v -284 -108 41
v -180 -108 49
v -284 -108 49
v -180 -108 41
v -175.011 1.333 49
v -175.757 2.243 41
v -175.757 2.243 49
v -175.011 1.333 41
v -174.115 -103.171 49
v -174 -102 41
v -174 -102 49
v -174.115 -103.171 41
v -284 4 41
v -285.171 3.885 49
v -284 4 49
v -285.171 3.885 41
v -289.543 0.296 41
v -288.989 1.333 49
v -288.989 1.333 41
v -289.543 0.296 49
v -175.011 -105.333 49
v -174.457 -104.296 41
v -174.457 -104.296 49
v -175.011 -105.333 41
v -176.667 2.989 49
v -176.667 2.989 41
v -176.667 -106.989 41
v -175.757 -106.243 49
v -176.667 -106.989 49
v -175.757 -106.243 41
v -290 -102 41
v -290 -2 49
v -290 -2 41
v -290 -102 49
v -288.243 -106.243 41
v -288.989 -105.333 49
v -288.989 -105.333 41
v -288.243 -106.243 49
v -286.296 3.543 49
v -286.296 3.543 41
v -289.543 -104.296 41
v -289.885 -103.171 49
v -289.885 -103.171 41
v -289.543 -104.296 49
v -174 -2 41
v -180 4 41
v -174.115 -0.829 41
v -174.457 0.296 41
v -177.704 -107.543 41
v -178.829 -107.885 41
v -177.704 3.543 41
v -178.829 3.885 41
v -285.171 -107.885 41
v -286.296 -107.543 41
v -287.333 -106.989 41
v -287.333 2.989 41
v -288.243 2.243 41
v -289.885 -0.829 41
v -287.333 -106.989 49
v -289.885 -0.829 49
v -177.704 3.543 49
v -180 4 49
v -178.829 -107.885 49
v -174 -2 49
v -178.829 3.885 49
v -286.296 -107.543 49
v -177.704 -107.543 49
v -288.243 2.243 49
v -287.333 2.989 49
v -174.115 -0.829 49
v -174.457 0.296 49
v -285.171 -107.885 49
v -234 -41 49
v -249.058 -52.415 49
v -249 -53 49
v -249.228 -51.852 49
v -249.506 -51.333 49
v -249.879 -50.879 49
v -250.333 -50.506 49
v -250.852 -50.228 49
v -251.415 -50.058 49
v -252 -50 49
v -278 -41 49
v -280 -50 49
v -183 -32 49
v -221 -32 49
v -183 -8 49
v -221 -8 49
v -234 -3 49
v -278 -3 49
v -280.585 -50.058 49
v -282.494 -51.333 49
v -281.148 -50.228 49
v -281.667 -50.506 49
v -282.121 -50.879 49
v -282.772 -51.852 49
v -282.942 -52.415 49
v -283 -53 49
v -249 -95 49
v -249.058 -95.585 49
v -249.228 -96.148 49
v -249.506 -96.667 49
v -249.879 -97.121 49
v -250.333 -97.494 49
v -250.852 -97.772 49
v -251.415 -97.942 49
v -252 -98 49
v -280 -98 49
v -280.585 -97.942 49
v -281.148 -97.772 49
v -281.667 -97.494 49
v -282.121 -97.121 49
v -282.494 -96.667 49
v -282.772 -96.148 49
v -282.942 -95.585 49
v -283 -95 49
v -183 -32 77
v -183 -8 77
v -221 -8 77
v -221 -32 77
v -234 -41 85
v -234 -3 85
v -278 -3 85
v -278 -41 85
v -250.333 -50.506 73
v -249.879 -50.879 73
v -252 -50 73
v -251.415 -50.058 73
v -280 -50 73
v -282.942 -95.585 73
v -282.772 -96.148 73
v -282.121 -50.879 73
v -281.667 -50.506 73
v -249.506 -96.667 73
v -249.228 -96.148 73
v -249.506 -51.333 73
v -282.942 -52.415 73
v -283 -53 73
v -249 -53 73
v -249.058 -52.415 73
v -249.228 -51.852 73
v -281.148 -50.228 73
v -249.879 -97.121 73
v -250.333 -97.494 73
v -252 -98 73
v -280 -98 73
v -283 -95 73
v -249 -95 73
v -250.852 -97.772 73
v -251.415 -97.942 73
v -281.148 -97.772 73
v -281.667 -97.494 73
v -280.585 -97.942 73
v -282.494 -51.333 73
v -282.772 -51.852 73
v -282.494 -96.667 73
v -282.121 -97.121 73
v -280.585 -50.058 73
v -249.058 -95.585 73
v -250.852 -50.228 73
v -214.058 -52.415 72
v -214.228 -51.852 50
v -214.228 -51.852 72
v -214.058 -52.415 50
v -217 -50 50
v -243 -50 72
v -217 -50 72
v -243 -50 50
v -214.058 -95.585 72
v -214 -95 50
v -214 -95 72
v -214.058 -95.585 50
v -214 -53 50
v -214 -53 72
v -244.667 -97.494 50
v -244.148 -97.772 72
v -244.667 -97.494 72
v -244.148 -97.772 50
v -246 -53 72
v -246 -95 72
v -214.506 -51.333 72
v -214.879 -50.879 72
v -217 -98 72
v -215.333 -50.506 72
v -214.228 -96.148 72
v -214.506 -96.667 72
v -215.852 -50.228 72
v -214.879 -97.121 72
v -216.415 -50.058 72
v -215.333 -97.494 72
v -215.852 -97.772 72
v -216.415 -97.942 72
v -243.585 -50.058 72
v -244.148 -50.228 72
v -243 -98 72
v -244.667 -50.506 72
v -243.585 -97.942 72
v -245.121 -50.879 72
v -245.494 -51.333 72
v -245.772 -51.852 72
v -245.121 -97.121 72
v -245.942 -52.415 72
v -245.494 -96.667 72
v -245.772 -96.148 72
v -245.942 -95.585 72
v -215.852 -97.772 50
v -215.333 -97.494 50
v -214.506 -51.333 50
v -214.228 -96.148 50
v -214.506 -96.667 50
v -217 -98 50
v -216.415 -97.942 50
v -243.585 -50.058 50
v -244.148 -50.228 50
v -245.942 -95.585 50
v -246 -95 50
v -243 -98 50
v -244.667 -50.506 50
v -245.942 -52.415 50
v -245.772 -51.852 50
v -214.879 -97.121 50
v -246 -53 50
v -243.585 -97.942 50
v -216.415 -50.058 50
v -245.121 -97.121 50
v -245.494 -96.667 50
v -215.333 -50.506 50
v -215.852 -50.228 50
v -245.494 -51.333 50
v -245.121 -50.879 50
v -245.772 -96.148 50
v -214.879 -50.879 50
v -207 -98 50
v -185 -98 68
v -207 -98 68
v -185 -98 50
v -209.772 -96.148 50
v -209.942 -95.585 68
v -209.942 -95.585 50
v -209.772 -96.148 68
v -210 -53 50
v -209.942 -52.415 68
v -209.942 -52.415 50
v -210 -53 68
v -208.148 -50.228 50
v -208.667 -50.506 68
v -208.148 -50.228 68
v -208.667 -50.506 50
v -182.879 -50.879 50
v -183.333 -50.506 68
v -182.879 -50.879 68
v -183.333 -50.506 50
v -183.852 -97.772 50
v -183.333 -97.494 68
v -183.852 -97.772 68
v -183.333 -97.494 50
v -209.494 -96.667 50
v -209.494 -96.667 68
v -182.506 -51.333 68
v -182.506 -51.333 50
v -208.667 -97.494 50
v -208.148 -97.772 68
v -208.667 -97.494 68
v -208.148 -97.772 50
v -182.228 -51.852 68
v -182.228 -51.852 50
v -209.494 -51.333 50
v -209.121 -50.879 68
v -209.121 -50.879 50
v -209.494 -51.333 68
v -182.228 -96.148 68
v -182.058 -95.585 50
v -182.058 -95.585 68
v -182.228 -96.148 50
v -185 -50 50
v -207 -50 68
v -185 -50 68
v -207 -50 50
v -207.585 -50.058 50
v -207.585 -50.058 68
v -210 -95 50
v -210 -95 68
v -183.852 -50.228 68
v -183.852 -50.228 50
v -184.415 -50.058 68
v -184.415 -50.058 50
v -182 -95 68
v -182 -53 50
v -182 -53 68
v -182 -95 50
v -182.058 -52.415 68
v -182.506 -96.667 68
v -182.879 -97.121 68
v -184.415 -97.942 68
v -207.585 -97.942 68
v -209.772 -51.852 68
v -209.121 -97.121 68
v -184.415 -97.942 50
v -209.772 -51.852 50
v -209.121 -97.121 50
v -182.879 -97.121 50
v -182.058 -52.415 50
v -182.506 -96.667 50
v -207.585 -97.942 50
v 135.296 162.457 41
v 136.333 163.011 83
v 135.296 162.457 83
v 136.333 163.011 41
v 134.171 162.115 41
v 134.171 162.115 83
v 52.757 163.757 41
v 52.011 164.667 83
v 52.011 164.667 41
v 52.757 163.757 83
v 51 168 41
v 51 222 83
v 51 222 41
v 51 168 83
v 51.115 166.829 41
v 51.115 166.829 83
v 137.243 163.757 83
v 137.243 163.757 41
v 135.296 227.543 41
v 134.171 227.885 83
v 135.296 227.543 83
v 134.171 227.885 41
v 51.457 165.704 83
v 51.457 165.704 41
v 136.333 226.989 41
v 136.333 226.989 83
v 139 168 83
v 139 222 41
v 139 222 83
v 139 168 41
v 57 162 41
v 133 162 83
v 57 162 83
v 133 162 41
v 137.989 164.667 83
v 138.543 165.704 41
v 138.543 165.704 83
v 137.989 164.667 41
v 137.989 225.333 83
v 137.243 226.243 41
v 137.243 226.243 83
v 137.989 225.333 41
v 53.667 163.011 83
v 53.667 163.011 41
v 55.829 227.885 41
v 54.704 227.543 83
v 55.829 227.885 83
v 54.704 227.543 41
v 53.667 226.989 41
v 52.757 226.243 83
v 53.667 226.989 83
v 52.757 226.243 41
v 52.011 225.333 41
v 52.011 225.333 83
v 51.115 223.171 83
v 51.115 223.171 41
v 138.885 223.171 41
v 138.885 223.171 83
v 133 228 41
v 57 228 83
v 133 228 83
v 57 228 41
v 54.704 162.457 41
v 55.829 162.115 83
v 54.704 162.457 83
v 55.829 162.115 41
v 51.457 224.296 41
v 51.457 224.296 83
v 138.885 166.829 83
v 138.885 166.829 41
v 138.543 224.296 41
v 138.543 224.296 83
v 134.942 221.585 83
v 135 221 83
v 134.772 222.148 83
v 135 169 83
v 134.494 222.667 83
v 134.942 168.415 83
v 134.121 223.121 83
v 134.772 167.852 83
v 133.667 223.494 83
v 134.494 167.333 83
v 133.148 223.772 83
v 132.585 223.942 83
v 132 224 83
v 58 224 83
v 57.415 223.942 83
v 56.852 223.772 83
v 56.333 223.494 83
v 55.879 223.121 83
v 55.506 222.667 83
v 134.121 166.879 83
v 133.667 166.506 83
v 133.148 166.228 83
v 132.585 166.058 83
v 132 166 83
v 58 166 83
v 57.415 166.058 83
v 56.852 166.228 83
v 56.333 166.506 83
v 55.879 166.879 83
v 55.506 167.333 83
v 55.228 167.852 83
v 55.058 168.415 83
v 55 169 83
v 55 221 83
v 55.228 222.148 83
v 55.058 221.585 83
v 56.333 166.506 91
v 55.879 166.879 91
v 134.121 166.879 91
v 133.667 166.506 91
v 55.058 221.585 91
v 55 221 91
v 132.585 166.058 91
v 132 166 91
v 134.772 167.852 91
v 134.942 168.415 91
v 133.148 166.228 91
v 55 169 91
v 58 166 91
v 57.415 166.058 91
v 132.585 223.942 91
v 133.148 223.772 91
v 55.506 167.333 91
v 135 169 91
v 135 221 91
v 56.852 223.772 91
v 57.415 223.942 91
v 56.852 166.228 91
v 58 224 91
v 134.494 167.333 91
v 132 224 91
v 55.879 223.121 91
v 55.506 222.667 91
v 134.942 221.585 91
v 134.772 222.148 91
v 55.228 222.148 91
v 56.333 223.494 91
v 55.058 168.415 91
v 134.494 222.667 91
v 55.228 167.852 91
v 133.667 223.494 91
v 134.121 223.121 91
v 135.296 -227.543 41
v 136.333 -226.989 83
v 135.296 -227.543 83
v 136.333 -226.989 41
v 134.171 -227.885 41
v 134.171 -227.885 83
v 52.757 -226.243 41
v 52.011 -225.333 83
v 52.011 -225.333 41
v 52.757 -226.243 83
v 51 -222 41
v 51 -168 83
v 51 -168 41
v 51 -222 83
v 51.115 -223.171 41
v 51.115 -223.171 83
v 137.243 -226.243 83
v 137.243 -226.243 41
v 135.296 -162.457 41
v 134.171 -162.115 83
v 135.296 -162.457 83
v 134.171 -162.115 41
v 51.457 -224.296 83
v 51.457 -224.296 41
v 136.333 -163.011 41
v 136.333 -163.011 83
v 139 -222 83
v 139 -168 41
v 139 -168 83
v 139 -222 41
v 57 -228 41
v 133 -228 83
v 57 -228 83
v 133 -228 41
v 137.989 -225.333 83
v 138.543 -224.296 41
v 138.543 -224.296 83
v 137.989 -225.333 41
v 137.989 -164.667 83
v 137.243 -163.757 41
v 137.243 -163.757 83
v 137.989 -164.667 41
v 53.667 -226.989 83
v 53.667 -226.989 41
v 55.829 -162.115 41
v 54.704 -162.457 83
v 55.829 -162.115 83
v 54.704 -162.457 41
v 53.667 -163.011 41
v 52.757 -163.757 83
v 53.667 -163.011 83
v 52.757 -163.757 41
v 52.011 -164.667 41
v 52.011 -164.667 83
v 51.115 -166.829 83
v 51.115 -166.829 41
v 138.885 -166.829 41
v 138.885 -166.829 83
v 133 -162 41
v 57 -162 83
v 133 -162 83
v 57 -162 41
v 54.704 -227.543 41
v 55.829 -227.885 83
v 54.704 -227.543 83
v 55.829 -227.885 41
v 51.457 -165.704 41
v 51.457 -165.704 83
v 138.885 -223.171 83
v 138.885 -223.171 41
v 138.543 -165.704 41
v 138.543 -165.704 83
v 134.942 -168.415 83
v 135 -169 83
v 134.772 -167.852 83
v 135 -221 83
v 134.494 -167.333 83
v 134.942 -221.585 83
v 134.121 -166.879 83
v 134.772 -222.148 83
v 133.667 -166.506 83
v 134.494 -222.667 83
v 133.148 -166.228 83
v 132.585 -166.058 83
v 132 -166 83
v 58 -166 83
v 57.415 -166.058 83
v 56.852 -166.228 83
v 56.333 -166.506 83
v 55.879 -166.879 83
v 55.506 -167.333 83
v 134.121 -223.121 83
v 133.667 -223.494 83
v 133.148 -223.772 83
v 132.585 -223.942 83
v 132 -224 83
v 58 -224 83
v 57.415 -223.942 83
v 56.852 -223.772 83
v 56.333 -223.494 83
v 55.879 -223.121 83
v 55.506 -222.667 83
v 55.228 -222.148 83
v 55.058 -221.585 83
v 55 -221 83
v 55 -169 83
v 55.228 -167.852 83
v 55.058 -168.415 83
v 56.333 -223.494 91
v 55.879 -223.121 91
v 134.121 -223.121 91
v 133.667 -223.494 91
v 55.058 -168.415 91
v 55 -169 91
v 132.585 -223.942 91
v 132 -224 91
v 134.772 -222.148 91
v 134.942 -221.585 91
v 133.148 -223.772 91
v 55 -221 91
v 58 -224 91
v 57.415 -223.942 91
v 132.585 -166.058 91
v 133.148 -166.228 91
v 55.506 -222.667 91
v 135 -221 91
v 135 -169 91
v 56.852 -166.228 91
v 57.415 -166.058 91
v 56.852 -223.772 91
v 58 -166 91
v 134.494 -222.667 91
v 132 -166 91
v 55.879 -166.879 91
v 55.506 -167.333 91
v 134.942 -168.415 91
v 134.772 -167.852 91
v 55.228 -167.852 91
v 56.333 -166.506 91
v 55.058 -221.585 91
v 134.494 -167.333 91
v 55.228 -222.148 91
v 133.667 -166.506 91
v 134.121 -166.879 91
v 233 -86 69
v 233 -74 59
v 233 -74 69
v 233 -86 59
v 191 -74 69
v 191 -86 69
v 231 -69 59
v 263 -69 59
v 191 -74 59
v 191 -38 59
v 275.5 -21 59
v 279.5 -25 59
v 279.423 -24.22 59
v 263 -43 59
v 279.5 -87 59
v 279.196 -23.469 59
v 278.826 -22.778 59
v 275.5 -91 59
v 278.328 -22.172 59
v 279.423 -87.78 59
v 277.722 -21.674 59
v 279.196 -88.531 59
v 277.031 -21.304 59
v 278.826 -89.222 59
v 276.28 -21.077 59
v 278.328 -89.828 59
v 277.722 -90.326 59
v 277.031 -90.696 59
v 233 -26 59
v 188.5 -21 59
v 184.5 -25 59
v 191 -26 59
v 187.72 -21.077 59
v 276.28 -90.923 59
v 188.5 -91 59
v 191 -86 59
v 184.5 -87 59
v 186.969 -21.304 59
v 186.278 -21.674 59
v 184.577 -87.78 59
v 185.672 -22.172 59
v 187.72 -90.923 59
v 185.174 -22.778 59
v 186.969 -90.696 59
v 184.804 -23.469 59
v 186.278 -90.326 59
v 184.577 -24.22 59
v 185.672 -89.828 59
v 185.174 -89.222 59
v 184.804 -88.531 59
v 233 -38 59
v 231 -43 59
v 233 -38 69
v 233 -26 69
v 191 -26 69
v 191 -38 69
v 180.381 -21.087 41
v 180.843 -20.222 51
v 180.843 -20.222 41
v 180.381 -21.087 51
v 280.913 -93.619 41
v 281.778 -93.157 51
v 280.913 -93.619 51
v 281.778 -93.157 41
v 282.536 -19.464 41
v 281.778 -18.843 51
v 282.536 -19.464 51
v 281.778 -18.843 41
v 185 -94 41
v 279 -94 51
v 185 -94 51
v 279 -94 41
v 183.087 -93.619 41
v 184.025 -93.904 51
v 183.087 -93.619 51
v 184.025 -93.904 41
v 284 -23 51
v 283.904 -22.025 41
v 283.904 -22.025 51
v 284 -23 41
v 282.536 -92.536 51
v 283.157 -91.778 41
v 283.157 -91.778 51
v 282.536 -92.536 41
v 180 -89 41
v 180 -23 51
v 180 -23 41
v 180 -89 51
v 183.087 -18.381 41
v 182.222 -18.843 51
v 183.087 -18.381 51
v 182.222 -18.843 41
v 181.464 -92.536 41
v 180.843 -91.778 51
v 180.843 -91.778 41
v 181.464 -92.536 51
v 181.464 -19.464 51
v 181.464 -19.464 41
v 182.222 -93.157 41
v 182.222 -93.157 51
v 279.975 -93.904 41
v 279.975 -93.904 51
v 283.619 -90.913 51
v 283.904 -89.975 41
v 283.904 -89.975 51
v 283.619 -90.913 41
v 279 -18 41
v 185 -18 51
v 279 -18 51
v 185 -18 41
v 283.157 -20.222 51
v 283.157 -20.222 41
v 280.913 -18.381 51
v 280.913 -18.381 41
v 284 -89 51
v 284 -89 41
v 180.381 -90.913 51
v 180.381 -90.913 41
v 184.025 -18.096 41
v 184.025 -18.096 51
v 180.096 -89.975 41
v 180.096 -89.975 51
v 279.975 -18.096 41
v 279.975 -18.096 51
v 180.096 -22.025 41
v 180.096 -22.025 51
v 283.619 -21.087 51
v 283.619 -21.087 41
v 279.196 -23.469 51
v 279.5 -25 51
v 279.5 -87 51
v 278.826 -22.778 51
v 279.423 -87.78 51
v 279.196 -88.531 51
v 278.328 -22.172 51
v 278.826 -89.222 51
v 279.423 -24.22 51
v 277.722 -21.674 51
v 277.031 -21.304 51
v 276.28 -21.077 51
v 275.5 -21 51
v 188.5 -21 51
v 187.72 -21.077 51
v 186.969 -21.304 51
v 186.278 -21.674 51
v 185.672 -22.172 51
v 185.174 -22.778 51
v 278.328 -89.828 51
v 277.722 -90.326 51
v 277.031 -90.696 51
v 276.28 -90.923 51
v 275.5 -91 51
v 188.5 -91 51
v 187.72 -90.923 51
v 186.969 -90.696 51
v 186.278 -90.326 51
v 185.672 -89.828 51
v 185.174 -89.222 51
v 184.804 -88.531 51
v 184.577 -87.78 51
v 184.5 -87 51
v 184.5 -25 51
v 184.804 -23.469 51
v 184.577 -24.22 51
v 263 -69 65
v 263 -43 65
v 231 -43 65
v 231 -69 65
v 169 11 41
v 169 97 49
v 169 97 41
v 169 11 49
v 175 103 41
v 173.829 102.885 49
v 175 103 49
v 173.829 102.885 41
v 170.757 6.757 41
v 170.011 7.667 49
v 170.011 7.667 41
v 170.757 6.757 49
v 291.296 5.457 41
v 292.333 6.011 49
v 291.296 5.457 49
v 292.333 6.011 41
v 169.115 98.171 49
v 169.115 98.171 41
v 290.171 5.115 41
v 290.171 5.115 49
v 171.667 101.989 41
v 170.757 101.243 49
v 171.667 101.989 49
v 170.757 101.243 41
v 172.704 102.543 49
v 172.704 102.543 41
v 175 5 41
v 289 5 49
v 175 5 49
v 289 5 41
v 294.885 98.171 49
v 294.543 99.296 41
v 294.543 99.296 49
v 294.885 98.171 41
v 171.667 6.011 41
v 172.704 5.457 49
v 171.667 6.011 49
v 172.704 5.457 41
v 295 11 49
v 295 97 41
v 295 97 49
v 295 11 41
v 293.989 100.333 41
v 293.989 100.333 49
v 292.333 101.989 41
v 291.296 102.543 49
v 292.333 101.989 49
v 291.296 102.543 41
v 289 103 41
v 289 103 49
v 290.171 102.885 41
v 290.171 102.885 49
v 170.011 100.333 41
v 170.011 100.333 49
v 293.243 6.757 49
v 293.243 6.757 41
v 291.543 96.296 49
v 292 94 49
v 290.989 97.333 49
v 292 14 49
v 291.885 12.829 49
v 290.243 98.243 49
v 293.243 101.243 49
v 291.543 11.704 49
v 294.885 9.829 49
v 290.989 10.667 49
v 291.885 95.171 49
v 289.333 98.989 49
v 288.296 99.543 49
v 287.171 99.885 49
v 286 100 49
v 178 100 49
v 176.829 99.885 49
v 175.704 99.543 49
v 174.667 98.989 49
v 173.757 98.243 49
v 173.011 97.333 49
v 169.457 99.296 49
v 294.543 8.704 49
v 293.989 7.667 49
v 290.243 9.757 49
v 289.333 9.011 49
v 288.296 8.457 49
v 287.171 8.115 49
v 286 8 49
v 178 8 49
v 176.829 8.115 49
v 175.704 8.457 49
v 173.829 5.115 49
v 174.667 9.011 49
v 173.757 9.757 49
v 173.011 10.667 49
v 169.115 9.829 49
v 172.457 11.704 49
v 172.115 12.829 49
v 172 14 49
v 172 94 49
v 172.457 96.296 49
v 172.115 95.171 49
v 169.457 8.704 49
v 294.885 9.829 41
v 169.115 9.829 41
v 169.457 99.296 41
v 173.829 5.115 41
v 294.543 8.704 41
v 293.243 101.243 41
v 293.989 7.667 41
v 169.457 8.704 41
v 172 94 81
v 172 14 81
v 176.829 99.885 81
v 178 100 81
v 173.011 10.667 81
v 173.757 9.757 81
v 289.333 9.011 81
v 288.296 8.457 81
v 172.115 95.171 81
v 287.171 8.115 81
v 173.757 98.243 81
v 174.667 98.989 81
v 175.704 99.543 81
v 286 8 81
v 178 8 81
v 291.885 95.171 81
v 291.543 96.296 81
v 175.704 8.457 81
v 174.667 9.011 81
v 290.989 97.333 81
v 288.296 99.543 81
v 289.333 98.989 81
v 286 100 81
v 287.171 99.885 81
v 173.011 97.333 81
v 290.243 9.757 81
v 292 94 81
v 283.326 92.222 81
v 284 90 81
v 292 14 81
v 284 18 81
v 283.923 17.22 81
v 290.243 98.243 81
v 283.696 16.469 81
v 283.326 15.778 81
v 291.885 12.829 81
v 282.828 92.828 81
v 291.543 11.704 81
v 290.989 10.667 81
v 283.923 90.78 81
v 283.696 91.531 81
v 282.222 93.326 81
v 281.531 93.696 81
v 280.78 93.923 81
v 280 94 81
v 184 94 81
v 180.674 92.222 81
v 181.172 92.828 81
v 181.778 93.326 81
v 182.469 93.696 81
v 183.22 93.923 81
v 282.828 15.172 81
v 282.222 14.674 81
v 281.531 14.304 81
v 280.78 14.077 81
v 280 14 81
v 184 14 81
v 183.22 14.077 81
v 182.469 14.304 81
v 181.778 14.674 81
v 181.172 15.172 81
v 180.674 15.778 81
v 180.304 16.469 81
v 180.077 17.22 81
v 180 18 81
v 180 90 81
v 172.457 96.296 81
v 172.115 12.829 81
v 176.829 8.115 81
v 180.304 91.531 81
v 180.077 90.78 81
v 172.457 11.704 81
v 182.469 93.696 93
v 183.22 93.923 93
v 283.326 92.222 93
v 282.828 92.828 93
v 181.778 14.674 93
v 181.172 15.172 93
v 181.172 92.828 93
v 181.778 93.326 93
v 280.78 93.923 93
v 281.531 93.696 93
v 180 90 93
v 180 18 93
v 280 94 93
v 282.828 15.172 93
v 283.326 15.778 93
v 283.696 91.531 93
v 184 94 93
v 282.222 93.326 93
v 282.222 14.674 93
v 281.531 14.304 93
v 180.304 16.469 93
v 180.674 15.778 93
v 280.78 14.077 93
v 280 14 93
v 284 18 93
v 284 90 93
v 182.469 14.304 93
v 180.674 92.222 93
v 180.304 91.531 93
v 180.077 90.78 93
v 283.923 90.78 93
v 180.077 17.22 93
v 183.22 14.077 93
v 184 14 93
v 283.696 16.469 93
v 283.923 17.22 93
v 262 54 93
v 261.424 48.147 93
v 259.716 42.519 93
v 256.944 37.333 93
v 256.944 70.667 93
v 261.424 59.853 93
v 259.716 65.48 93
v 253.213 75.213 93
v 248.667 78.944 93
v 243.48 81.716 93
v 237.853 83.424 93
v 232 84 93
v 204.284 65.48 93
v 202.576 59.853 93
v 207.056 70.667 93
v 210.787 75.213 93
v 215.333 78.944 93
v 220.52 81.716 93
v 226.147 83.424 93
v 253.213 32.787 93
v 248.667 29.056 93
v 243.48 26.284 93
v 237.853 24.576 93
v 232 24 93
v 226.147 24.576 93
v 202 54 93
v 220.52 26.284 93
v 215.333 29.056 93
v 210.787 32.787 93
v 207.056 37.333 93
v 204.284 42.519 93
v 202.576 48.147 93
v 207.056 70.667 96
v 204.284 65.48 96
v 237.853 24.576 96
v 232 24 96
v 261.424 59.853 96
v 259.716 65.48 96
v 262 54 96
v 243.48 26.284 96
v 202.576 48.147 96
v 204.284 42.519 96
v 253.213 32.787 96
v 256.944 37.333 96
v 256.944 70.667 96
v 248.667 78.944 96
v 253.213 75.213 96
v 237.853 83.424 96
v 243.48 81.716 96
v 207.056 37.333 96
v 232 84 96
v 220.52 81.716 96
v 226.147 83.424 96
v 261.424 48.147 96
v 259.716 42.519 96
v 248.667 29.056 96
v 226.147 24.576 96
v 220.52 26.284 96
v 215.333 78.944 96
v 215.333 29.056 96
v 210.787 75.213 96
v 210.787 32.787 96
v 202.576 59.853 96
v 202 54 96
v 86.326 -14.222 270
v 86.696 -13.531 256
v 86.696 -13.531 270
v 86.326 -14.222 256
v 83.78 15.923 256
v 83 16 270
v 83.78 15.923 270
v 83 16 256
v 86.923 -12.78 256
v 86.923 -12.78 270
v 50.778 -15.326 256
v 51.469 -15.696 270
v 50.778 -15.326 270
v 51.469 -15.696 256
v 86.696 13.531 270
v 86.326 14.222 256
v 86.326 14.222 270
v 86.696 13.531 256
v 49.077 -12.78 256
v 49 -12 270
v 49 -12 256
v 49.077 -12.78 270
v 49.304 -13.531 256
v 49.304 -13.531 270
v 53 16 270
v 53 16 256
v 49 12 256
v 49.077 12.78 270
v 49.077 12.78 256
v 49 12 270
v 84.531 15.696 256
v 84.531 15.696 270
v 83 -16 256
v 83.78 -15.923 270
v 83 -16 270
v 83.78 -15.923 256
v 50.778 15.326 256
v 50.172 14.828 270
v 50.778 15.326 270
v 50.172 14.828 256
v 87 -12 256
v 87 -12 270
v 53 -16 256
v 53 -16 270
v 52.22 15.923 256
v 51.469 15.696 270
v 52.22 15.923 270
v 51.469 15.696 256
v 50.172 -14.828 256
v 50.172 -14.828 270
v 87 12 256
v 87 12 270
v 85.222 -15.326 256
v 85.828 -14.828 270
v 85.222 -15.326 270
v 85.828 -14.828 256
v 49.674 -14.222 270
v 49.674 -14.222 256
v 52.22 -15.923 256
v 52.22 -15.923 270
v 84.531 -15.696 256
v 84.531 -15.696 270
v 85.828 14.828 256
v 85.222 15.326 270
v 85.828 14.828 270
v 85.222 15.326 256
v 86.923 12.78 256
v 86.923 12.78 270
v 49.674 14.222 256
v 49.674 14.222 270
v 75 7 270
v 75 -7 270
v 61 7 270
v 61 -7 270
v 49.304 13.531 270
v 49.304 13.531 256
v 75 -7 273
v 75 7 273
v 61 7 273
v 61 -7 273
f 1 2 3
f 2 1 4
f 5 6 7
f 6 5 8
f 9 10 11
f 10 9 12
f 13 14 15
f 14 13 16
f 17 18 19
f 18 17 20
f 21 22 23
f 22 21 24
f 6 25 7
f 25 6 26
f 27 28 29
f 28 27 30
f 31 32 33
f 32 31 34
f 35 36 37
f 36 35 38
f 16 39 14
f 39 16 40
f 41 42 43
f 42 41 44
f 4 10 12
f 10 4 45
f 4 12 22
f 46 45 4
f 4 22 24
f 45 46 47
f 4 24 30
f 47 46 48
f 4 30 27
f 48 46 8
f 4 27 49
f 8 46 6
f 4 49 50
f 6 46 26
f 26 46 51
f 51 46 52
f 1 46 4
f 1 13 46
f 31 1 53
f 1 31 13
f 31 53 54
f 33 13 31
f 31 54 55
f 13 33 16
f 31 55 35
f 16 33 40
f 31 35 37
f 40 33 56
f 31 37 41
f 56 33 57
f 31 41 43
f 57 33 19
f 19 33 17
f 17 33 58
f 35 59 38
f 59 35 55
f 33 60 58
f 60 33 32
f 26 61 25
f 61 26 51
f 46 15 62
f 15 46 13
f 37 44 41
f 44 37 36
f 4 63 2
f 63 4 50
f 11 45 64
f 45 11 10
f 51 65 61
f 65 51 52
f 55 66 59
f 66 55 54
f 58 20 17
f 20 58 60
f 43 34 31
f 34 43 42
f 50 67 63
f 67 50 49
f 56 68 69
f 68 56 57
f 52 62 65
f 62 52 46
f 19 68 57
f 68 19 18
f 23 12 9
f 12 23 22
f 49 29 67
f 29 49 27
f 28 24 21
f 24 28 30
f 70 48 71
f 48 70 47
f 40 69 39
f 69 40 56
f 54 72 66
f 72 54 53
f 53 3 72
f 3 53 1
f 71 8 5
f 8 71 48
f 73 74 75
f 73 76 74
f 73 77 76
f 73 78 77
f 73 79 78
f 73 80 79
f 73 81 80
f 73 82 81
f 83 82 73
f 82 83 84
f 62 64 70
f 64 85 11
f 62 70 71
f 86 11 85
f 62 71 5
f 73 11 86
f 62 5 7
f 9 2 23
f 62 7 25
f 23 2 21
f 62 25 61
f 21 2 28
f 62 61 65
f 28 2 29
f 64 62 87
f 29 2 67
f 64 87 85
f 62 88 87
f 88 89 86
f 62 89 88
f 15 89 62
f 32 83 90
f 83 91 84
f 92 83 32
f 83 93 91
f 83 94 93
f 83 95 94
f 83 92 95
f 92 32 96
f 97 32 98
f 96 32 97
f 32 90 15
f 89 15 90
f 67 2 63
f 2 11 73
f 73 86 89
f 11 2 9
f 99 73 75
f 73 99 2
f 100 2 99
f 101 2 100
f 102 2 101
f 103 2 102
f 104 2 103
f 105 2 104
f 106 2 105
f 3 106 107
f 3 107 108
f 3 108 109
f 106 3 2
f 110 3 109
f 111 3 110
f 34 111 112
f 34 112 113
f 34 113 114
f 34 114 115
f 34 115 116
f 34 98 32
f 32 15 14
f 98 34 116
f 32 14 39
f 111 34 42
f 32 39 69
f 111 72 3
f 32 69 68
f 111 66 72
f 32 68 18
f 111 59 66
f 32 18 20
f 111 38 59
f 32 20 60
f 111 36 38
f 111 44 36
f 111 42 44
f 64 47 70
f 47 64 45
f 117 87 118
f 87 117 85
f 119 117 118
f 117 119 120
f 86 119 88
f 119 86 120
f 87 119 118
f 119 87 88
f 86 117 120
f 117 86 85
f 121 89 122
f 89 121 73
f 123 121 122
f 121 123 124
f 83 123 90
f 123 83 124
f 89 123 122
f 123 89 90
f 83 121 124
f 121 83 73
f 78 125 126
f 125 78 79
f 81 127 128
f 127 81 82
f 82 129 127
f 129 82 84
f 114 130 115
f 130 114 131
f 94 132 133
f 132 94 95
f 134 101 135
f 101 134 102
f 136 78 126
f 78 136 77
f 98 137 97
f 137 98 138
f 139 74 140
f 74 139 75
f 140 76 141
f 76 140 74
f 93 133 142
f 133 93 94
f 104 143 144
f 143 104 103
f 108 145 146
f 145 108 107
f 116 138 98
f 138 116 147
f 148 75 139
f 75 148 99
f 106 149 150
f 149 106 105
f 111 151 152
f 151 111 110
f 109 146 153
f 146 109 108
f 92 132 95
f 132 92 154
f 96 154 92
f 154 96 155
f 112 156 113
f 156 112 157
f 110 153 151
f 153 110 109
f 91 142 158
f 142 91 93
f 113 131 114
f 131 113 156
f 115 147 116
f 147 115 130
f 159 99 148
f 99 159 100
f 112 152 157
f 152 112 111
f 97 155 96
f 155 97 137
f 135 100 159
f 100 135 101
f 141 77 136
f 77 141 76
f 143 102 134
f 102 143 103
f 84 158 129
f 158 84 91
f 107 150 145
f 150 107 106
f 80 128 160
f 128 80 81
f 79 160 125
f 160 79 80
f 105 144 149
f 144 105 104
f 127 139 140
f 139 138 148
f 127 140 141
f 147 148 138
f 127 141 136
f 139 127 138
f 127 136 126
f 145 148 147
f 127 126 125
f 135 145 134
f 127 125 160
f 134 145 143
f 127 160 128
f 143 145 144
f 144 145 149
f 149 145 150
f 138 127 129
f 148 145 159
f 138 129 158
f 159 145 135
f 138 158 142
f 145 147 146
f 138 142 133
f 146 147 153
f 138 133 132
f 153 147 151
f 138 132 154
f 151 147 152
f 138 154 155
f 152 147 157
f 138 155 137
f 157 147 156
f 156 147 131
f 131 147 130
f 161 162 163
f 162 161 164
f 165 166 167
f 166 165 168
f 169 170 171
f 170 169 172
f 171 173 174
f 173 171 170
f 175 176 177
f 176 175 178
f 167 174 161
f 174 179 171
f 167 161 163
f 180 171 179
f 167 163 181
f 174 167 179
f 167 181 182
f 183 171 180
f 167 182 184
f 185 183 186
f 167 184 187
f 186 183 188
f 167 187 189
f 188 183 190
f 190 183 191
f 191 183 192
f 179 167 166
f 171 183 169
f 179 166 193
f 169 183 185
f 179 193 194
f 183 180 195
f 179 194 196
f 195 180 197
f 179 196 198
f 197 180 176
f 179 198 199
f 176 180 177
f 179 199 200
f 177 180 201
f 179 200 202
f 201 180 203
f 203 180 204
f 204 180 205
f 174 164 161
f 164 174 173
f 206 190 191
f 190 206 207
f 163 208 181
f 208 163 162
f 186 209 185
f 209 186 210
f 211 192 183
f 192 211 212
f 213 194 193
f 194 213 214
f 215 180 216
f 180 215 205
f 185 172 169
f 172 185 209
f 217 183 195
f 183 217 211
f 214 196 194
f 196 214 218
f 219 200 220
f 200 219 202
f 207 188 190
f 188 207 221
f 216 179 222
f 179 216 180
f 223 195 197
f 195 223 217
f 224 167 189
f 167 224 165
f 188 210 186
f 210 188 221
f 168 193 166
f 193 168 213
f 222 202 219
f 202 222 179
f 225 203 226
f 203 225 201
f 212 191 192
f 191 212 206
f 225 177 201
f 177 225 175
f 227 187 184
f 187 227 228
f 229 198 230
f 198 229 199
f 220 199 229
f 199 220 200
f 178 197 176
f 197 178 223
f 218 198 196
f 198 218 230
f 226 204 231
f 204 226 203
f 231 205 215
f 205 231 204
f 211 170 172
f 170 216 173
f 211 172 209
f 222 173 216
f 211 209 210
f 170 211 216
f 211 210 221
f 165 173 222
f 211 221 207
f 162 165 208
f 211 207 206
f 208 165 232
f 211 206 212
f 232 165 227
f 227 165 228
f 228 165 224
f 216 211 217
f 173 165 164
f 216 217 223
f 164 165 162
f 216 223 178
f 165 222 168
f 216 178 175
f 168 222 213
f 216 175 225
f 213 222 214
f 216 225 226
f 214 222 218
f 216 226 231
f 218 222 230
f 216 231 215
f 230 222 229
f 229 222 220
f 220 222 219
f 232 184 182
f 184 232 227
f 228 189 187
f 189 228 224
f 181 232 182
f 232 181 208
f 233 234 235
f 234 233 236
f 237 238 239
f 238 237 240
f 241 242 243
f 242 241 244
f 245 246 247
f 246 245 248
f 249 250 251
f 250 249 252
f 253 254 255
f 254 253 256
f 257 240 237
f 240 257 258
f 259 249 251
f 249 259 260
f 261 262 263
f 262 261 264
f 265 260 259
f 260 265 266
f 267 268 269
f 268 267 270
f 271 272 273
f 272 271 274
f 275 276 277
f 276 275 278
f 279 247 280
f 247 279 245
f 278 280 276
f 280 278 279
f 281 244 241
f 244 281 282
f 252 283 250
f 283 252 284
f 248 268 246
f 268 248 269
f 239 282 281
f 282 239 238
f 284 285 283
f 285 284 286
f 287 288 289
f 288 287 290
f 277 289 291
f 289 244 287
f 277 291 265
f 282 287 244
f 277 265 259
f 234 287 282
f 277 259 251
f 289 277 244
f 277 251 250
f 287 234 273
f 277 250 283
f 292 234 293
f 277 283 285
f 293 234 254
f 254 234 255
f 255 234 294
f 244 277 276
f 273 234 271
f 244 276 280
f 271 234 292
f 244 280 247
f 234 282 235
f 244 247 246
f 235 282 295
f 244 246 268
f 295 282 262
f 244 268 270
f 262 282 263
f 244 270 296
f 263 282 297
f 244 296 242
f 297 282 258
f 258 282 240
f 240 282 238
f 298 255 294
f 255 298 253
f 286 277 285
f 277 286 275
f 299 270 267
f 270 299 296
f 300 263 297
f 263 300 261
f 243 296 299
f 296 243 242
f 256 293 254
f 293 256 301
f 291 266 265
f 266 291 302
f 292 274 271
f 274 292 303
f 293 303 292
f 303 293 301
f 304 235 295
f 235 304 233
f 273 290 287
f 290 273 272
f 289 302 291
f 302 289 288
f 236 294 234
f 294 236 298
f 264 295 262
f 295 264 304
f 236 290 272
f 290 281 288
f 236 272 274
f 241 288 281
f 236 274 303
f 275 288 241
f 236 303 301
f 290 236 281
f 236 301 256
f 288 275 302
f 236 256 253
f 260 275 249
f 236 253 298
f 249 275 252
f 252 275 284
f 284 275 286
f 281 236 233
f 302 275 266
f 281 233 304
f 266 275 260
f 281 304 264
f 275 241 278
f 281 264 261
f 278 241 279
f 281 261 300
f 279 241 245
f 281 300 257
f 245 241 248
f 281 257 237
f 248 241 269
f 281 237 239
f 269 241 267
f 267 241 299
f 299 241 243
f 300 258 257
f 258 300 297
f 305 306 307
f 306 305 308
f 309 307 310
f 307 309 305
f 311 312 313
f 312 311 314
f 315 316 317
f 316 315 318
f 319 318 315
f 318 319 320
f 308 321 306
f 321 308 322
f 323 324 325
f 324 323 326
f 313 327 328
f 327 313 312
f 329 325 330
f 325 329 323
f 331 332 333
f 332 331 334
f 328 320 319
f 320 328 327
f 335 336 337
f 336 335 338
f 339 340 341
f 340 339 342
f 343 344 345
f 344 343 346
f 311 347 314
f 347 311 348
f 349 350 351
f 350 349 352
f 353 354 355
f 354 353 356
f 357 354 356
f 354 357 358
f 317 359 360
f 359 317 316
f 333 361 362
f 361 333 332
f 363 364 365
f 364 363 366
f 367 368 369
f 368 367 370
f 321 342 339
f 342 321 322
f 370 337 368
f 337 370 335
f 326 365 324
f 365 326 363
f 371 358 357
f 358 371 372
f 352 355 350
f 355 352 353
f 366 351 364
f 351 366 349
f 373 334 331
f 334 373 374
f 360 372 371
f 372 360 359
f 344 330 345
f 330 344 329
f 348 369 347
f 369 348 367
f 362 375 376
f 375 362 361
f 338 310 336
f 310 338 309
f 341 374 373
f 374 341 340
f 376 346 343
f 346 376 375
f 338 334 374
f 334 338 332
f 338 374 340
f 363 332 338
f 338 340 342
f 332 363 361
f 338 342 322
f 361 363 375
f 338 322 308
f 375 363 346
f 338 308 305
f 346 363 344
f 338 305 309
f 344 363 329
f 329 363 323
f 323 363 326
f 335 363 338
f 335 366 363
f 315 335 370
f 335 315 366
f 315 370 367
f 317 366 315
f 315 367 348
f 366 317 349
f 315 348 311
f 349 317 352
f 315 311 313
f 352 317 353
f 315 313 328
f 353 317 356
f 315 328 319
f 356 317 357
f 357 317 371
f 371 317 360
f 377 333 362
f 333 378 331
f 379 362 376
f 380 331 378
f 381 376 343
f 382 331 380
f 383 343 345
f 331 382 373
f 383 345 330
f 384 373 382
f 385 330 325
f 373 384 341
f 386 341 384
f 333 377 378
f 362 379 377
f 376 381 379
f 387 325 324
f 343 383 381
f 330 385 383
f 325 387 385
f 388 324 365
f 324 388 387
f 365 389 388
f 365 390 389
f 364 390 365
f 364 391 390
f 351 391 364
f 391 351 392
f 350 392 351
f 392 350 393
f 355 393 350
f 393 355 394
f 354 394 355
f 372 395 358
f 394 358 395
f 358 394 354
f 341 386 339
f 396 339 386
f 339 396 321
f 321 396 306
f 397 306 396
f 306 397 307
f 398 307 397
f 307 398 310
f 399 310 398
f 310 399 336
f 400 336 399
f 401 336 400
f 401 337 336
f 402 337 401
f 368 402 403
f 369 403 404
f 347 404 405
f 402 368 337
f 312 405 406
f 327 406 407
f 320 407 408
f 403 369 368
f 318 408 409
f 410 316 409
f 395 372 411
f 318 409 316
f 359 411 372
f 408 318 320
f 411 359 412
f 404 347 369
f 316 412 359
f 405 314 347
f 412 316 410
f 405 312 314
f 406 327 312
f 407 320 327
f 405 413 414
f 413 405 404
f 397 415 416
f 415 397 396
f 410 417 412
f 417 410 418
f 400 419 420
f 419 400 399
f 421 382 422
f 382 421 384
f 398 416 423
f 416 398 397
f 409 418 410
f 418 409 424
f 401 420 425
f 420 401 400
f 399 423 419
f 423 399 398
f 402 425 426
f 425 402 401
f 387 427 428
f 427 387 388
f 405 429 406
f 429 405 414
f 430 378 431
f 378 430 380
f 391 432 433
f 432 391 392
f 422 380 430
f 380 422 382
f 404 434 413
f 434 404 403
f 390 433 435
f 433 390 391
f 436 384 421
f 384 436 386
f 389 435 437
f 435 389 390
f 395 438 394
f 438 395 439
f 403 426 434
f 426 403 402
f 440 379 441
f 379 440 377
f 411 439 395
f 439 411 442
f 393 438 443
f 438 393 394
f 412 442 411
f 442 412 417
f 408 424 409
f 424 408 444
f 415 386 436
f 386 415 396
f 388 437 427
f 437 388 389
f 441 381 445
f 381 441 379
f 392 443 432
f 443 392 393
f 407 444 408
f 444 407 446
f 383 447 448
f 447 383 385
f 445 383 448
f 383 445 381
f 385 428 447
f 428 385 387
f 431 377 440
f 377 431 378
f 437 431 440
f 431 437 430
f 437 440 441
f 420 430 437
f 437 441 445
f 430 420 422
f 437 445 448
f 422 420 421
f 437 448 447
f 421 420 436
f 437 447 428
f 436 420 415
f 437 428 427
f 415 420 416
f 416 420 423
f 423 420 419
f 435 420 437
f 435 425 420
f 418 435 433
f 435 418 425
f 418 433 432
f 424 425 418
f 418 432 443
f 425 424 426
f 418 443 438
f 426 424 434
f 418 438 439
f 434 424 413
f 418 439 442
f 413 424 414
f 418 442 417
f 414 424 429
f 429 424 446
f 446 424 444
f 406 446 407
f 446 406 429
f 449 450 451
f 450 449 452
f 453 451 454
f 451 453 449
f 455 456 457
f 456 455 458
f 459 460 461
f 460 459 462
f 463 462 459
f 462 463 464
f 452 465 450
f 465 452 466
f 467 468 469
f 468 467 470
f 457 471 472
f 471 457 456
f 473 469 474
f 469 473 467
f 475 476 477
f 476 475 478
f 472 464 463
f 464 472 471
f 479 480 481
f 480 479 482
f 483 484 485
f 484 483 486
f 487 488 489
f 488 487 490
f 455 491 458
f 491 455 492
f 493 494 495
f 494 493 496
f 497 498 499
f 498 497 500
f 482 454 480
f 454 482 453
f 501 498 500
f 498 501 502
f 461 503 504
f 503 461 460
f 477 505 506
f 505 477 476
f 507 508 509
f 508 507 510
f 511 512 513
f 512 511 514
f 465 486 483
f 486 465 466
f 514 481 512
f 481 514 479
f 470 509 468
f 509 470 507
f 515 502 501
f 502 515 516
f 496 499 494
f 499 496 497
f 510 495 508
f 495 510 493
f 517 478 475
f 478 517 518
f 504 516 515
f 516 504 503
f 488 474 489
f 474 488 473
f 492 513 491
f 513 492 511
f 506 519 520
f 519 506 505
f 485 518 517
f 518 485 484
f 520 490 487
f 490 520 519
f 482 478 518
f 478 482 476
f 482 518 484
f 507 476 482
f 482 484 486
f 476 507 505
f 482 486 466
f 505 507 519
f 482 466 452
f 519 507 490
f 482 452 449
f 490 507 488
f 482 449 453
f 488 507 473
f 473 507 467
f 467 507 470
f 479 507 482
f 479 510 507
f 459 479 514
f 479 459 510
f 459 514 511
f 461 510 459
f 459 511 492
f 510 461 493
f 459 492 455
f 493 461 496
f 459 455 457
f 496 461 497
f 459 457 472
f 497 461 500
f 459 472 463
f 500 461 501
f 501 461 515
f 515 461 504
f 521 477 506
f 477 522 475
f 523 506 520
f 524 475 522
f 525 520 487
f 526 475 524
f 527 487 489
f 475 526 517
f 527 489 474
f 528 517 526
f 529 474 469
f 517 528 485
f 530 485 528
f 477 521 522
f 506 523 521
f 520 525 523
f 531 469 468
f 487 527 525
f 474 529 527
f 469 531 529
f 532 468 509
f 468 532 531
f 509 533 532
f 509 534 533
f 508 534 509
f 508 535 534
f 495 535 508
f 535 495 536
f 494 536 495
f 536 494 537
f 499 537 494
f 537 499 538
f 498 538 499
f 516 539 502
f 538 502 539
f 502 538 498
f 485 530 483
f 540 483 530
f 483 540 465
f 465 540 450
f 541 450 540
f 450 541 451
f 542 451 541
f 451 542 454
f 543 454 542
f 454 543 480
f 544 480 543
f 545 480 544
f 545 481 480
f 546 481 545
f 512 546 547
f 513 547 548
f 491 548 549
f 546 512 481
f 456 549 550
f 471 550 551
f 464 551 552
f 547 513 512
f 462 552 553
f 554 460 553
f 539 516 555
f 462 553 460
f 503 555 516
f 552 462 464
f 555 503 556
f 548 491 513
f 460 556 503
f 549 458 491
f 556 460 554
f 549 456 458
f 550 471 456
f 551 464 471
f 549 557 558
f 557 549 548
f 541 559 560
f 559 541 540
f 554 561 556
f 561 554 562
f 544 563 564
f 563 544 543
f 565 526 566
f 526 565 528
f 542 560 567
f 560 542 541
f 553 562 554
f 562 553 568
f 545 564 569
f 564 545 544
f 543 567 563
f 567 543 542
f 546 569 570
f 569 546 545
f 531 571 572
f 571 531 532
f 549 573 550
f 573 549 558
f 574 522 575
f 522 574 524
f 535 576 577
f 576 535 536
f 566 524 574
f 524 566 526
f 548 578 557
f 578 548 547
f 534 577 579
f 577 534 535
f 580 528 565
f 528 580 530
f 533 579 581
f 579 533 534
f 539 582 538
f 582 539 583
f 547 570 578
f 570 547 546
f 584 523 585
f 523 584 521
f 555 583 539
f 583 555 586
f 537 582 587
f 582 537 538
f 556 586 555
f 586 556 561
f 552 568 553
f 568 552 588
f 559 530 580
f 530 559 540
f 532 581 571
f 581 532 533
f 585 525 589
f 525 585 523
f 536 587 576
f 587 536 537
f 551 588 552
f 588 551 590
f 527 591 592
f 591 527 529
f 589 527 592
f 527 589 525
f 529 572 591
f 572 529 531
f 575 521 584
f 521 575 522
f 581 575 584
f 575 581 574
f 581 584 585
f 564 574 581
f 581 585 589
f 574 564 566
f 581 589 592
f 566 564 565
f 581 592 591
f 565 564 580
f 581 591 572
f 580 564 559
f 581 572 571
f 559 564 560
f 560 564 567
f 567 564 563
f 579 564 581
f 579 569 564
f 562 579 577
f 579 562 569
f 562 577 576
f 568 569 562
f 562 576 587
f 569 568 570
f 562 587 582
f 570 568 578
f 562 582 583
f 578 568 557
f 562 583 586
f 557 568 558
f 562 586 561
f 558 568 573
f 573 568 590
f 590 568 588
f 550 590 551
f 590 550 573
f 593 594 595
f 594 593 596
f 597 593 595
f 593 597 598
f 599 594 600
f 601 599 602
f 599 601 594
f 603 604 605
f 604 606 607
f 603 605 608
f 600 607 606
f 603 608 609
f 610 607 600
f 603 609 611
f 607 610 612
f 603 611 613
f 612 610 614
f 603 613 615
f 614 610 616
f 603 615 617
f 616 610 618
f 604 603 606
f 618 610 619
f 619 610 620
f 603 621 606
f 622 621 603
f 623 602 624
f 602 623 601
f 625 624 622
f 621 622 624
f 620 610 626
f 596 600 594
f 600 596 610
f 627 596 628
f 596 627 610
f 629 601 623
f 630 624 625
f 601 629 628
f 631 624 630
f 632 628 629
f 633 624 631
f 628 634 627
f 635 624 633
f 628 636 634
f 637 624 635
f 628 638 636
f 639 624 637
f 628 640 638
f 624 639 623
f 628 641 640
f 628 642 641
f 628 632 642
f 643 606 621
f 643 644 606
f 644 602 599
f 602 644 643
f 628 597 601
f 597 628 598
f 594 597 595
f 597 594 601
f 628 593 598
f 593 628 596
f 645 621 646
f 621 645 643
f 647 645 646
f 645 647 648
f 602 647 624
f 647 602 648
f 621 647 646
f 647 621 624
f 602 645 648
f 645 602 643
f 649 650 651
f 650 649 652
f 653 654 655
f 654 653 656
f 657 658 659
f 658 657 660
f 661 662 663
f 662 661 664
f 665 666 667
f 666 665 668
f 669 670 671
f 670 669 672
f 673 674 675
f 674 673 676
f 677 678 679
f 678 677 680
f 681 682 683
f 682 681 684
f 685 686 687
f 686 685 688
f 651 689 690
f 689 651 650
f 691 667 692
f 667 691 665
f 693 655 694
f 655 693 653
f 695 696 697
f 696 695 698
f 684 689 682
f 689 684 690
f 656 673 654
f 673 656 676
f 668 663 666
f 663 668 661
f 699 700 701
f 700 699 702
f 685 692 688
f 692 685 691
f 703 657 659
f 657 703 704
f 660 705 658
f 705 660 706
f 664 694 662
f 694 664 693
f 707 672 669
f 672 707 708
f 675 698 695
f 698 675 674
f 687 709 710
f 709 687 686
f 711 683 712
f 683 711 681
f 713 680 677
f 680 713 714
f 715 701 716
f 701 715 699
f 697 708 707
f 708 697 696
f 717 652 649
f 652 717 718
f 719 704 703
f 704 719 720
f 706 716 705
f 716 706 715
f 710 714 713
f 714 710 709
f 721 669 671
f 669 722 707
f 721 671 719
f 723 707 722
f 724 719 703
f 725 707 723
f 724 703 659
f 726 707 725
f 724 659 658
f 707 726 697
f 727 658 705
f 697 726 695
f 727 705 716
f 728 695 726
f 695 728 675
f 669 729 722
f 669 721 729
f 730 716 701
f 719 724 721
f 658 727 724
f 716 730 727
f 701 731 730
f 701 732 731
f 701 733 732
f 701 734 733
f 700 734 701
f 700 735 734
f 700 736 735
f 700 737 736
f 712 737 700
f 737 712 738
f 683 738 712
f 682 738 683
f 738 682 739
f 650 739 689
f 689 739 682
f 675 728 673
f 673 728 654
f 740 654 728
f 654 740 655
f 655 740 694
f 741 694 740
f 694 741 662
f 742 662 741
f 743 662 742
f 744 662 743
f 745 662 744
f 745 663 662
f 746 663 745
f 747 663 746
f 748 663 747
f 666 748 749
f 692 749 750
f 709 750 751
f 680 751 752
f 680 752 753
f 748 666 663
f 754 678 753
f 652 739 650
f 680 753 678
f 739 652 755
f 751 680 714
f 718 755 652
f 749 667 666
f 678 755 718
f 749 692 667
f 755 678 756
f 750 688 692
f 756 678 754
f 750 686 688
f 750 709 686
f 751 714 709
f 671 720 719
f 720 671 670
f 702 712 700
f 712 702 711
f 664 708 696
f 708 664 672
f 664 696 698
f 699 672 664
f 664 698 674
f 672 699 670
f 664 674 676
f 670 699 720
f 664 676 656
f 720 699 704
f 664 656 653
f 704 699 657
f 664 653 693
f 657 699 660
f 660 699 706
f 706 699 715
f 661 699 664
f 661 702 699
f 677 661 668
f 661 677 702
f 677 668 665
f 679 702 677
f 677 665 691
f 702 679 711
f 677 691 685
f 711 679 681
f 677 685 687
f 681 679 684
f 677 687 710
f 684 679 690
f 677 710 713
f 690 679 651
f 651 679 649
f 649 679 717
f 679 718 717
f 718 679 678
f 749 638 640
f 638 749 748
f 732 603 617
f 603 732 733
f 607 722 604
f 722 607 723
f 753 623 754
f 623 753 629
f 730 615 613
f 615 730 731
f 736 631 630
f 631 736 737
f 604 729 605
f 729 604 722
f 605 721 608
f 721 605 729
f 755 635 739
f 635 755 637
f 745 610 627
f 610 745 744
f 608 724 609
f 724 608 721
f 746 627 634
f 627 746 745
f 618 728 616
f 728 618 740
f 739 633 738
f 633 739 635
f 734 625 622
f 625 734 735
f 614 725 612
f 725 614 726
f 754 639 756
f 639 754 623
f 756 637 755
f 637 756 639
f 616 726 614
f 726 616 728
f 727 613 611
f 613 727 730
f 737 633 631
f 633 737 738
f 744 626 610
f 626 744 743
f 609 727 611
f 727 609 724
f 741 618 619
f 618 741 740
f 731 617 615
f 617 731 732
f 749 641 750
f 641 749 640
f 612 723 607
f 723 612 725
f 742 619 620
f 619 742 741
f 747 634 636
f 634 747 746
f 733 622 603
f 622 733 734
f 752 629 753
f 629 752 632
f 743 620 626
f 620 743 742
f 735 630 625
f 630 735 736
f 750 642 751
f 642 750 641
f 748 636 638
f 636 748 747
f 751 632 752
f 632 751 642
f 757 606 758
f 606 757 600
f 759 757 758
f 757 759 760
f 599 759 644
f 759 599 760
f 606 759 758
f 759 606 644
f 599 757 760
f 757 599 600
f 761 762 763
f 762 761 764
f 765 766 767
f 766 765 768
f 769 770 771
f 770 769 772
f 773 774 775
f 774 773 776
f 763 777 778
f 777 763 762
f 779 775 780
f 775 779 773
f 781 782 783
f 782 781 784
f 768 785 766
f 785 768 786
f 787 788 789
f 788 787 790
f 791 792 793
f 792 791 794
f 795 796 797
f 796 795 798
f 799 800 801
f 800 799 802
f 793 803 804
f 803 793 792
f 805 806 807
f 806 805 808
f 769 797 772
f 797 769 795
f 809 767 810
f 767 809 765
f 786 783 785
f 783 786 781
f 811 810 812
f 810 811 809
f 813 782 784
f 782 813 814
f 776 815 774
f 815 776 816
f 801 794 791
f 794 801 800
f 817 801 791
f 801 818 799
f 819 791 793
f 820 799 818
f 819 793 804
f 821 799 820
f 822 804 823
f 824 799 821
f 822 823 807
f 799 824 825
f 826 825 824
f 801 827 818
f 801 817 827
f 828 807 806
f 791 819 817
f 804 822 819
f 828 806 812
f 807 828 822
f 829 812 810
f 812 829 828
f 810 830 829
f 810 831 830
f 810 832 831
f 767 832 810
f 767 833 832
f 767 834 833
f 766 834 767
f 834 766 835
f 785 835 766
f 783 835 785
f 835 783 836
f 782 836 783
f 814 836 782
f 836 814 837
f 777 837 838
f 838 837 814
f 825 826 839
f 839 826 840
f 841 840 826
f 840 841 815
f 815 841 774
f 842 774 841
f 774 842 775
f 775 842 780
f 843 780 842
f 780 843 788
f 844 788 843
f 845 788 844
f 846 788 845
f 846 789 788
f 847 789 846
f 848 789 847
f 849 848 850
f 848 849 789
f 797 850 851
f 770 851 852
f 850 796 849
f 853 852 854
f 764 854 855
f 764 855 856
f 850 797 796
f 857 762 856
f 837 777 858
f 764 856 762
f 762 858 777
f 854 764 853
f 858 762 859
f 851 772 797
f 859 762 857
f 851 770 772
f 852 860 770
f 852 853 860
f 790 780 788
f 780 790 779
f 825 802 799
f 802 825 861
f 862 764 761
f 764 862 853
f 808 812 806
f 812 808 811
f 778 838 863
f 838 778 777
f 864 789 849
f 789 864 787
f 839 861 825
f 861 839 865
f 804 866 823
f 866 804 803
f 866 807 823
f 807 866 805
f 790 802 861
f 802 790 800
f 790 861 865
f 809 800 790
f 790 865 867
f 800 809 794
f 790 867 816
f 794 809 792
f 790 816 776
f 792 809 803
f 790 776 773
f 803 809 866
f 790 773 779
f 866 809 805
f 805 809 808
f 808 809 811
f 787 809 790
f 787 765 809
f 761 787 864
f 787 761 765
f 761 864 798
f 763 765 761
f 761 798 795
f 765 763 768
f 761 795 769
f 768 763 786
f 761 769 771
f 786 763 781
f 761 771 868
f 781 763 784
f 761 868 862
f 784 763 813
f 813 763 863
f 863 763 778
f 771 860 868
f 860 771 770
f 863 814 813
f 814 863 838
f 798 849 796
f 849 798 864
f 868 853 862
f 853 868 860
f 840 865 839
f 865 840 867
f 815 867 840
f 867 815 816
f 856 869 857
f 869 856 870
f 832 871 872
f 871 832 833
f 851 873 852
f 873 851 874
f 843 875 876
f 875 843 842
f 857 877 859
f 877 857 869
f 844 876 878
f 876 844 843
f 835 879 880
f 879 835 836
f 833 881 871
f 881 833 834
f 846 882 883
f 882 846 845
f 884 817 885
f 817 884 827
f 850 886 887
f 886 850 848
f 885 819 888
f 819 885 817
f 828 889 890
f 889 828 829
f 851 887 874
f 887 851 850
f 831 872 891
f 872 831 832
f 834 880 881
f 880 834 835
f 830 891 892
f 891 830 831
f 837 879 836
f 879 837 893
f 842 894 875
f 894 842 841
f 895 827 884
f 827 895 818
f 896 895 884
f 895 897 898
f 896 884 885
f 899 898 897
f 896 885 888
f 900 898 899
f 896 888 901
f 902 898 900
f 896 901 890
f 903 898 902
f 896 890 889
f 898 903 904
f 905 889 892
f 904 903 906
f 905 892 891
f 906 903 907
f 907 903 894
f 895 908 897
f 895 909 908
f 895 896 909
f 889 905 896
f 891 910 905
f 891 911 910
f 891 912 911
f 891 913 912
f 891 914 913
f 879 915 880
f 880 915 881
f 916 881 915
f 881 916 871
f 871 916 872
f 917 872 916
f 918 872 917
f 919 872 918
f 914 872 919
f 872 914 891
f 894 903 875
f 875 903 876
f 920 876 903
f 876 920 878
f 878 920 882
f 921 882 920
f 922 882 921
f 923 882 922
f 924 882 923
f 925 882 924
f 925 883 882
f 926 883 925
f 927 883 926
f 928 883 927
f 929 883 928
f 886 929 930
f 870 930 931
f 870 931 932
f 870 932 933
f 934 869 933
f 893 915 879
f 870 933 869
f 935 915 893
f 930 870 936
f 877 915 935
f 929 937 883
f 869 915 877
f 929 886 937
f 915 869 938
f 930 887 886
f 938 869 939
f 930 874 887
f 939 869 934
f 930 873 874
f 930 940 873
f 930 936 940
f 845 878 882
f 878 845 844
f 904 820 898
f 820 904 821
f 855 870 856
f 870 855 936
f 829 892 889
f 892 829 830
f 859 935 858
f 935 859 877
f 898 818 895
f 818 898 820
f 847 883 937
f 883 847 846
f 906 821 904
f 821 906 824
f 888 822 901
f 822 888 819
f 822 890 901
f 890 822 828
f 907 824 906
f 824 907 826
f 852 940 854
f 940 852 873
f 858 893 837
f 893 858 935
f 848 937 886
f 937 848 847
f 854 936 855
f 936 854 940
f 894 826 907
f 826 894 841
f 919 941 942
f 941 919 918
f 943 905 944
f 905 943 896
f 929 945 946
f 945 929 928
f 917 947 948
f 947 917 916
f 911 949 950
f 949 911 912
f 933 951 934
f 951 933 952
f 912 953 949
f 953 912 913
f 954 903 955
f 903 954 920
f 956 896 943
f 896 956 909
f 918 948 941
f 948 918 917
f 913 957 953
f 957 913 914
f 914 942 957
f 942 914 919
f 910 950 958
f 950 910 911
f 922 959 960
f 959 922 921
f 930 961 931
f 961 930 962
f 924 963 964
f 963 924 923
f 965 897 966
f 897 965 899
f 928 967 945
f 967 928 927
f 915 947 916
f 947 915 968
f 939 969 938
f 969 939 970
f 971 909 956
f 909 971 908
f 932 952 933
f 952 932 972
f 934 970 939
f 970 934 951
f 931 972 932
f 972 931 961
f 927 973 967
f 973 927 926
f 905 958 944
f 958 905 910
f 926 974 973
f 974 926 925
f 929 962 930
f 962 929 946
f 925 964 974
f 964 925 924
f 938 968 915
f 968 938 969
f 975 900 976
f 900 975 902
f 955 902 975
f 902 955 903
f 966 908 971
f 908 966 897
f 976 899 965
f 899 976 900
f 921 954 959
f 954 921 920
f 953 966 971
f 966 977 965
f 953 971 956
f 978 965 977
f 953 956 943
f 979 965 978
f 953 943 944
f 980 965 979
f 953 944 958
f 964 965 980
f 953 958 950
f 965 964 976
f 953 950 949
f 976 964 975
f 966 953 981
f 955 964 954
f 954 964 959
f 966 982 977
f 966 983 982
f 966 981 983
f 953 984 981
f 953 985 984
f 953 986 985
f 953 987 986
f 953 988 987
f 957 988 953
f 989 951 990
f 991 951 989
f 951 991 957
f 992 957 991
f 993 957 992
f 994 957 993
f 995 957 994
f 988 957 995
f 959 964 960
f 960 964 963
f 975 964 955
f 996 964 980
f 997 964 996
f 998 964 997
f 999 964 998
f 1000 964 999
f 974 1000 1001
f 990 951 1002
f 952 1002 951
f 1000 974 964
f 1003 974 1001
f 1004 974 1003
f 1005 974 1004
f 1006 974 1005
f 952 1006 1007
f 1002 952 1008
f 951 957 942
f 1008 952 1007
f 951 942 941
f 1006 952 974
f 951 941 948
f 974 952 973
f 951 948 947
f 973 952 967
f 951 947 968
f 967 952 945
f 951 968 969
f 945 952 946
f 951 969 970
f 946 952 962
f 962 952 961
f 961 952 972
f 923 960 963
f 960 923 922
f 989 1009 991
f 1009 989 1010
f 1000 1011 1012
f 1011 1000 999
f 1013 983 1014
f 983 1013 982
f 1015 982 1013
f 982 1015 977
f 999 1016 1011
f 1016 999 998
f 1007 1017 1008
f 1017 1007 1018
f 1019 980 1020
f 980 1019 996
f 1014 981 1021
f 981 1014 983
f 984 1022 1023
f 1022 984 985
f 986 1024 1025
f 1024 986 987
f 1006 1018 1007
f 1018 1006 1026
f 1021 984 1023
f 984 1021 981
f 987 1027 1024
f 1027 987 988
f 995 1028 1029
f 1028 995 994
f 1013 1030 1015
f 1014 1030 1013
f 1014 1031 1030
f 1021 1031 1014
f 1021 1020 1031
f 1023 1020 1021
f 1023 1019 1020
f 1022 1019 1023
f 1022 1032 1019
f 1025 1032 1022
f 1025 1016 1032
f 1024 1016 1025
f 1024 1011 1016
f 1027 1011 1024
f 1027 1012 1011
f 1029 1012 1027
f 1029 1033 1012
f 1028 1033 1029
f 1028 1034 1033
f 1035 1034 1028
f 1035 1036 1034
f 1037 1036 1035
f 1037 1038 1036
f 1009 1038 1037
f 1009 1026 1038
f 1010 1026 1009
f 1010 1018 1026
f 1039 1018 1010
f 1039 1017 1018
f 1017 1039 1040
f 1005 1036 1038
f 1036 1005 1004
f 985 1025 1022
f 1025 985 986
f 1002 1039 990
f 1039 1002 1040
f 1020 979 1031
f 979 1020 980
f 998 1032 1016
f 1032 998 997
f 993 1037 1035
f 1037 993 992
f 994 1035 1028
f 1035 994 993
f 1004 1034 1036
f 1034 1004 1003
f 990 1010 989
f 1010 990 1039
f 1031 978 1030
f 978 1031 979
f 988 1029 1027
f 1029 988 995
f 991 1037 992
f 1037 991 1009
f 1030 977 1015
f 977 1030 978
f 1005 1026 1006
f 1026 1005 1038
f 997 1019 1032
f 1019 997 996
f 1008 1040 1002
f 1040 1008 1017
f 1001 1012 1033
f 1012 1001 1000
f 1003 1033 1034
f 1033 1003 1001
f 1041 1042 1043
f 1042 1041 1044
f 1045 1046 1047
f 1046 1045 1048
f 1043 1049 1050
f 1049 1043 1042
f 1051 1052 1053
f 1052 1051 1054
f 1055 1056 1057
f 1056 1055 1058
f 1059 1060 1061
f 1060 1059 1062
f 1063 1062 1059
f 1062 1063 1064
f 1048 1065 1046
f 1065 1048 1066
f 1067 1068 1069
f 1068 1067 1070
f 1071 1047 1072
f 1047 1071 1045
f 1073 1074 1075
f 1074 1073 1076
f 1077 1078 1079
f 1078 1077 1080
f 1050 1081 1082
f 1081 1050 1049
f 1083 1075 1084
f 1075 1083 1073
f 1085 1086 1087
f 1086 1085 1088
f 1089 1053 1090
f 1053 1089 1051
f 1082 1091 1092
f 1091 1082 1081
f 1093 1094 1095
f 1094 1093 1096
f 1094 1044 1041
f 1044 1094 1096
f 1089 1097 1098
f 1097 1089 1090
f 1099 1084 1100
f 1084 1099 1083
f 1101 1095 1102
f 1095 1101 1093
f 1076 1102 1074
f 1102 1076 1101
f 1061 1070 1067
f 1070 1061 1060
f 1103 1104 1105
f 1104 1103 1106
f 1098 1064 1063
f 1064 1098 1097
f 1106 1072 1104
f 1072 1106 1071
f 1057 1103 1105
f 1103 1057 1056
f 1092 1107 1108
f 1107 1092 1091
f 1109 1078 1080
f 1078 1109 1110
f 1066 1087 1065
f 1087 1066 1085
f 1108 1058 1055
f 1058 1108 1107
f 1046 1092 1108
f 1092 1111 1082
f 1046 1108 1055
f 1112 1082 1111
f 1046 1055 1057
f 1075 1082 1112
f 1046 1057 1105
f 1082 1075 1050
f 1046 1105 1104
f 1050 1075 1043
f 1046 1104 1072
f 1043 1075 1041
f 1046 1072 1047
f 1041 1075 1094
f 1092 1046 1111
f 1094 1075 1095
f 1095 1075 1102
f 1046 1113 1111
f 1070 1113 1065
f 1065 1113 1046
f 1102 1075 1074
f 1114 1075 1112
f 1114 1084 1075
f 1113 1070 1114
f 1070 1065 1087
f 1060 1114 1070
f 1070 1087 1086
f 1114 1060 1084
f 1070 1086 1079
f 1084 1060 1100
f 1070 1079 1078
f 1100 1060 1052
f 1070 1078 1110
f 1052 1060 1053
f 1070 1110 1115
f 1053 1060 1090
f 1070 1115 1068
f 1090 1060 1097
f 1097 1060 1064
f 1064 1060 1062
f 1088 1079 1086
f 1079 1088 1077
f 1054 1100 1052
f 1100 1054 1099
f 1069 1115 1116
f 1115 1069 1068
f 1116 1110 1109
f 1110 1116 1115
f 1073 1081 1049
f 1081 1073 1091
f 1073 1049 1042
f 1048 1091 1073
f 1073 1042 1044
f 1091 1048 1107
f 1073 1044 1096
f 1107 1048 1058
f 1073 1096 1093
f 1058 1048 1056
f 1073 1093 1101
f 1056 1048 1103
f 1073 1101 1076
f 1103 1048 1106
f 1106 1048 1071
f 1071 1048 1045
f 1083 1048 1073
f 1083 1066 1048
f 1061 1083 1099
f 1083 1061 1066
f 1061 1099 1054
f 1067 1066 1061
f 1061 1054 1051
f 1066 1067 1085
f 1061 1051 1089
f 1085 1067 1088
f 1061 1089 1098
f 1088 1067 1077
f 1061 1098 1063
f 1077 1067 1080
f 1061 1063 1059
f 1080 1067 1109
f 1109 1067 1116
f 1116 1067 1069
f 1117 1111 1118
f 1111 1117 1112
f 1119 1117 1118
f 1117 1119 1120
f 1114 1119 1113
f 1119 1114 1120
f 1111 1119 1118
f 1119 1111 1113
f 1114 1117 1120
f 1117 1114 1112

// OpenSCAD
// ============================================================================
// FILE: export_electronics.scad
// OUTPUT: electronics_visual.stl
// URDF LINK: electronics_link
// ============================================================================

export_only = true;

include <main.scad>

union() {
    // Power distribution and converters
    power_distribution();

    // Motor controllers
    motor_driver(1);
    motor_driver(-1);

    // Low-level controller
    esp32_s3_controller();

    // ROS 2 computer
    jetson_or_sbc();

    // IMU
    imu_module();
}
